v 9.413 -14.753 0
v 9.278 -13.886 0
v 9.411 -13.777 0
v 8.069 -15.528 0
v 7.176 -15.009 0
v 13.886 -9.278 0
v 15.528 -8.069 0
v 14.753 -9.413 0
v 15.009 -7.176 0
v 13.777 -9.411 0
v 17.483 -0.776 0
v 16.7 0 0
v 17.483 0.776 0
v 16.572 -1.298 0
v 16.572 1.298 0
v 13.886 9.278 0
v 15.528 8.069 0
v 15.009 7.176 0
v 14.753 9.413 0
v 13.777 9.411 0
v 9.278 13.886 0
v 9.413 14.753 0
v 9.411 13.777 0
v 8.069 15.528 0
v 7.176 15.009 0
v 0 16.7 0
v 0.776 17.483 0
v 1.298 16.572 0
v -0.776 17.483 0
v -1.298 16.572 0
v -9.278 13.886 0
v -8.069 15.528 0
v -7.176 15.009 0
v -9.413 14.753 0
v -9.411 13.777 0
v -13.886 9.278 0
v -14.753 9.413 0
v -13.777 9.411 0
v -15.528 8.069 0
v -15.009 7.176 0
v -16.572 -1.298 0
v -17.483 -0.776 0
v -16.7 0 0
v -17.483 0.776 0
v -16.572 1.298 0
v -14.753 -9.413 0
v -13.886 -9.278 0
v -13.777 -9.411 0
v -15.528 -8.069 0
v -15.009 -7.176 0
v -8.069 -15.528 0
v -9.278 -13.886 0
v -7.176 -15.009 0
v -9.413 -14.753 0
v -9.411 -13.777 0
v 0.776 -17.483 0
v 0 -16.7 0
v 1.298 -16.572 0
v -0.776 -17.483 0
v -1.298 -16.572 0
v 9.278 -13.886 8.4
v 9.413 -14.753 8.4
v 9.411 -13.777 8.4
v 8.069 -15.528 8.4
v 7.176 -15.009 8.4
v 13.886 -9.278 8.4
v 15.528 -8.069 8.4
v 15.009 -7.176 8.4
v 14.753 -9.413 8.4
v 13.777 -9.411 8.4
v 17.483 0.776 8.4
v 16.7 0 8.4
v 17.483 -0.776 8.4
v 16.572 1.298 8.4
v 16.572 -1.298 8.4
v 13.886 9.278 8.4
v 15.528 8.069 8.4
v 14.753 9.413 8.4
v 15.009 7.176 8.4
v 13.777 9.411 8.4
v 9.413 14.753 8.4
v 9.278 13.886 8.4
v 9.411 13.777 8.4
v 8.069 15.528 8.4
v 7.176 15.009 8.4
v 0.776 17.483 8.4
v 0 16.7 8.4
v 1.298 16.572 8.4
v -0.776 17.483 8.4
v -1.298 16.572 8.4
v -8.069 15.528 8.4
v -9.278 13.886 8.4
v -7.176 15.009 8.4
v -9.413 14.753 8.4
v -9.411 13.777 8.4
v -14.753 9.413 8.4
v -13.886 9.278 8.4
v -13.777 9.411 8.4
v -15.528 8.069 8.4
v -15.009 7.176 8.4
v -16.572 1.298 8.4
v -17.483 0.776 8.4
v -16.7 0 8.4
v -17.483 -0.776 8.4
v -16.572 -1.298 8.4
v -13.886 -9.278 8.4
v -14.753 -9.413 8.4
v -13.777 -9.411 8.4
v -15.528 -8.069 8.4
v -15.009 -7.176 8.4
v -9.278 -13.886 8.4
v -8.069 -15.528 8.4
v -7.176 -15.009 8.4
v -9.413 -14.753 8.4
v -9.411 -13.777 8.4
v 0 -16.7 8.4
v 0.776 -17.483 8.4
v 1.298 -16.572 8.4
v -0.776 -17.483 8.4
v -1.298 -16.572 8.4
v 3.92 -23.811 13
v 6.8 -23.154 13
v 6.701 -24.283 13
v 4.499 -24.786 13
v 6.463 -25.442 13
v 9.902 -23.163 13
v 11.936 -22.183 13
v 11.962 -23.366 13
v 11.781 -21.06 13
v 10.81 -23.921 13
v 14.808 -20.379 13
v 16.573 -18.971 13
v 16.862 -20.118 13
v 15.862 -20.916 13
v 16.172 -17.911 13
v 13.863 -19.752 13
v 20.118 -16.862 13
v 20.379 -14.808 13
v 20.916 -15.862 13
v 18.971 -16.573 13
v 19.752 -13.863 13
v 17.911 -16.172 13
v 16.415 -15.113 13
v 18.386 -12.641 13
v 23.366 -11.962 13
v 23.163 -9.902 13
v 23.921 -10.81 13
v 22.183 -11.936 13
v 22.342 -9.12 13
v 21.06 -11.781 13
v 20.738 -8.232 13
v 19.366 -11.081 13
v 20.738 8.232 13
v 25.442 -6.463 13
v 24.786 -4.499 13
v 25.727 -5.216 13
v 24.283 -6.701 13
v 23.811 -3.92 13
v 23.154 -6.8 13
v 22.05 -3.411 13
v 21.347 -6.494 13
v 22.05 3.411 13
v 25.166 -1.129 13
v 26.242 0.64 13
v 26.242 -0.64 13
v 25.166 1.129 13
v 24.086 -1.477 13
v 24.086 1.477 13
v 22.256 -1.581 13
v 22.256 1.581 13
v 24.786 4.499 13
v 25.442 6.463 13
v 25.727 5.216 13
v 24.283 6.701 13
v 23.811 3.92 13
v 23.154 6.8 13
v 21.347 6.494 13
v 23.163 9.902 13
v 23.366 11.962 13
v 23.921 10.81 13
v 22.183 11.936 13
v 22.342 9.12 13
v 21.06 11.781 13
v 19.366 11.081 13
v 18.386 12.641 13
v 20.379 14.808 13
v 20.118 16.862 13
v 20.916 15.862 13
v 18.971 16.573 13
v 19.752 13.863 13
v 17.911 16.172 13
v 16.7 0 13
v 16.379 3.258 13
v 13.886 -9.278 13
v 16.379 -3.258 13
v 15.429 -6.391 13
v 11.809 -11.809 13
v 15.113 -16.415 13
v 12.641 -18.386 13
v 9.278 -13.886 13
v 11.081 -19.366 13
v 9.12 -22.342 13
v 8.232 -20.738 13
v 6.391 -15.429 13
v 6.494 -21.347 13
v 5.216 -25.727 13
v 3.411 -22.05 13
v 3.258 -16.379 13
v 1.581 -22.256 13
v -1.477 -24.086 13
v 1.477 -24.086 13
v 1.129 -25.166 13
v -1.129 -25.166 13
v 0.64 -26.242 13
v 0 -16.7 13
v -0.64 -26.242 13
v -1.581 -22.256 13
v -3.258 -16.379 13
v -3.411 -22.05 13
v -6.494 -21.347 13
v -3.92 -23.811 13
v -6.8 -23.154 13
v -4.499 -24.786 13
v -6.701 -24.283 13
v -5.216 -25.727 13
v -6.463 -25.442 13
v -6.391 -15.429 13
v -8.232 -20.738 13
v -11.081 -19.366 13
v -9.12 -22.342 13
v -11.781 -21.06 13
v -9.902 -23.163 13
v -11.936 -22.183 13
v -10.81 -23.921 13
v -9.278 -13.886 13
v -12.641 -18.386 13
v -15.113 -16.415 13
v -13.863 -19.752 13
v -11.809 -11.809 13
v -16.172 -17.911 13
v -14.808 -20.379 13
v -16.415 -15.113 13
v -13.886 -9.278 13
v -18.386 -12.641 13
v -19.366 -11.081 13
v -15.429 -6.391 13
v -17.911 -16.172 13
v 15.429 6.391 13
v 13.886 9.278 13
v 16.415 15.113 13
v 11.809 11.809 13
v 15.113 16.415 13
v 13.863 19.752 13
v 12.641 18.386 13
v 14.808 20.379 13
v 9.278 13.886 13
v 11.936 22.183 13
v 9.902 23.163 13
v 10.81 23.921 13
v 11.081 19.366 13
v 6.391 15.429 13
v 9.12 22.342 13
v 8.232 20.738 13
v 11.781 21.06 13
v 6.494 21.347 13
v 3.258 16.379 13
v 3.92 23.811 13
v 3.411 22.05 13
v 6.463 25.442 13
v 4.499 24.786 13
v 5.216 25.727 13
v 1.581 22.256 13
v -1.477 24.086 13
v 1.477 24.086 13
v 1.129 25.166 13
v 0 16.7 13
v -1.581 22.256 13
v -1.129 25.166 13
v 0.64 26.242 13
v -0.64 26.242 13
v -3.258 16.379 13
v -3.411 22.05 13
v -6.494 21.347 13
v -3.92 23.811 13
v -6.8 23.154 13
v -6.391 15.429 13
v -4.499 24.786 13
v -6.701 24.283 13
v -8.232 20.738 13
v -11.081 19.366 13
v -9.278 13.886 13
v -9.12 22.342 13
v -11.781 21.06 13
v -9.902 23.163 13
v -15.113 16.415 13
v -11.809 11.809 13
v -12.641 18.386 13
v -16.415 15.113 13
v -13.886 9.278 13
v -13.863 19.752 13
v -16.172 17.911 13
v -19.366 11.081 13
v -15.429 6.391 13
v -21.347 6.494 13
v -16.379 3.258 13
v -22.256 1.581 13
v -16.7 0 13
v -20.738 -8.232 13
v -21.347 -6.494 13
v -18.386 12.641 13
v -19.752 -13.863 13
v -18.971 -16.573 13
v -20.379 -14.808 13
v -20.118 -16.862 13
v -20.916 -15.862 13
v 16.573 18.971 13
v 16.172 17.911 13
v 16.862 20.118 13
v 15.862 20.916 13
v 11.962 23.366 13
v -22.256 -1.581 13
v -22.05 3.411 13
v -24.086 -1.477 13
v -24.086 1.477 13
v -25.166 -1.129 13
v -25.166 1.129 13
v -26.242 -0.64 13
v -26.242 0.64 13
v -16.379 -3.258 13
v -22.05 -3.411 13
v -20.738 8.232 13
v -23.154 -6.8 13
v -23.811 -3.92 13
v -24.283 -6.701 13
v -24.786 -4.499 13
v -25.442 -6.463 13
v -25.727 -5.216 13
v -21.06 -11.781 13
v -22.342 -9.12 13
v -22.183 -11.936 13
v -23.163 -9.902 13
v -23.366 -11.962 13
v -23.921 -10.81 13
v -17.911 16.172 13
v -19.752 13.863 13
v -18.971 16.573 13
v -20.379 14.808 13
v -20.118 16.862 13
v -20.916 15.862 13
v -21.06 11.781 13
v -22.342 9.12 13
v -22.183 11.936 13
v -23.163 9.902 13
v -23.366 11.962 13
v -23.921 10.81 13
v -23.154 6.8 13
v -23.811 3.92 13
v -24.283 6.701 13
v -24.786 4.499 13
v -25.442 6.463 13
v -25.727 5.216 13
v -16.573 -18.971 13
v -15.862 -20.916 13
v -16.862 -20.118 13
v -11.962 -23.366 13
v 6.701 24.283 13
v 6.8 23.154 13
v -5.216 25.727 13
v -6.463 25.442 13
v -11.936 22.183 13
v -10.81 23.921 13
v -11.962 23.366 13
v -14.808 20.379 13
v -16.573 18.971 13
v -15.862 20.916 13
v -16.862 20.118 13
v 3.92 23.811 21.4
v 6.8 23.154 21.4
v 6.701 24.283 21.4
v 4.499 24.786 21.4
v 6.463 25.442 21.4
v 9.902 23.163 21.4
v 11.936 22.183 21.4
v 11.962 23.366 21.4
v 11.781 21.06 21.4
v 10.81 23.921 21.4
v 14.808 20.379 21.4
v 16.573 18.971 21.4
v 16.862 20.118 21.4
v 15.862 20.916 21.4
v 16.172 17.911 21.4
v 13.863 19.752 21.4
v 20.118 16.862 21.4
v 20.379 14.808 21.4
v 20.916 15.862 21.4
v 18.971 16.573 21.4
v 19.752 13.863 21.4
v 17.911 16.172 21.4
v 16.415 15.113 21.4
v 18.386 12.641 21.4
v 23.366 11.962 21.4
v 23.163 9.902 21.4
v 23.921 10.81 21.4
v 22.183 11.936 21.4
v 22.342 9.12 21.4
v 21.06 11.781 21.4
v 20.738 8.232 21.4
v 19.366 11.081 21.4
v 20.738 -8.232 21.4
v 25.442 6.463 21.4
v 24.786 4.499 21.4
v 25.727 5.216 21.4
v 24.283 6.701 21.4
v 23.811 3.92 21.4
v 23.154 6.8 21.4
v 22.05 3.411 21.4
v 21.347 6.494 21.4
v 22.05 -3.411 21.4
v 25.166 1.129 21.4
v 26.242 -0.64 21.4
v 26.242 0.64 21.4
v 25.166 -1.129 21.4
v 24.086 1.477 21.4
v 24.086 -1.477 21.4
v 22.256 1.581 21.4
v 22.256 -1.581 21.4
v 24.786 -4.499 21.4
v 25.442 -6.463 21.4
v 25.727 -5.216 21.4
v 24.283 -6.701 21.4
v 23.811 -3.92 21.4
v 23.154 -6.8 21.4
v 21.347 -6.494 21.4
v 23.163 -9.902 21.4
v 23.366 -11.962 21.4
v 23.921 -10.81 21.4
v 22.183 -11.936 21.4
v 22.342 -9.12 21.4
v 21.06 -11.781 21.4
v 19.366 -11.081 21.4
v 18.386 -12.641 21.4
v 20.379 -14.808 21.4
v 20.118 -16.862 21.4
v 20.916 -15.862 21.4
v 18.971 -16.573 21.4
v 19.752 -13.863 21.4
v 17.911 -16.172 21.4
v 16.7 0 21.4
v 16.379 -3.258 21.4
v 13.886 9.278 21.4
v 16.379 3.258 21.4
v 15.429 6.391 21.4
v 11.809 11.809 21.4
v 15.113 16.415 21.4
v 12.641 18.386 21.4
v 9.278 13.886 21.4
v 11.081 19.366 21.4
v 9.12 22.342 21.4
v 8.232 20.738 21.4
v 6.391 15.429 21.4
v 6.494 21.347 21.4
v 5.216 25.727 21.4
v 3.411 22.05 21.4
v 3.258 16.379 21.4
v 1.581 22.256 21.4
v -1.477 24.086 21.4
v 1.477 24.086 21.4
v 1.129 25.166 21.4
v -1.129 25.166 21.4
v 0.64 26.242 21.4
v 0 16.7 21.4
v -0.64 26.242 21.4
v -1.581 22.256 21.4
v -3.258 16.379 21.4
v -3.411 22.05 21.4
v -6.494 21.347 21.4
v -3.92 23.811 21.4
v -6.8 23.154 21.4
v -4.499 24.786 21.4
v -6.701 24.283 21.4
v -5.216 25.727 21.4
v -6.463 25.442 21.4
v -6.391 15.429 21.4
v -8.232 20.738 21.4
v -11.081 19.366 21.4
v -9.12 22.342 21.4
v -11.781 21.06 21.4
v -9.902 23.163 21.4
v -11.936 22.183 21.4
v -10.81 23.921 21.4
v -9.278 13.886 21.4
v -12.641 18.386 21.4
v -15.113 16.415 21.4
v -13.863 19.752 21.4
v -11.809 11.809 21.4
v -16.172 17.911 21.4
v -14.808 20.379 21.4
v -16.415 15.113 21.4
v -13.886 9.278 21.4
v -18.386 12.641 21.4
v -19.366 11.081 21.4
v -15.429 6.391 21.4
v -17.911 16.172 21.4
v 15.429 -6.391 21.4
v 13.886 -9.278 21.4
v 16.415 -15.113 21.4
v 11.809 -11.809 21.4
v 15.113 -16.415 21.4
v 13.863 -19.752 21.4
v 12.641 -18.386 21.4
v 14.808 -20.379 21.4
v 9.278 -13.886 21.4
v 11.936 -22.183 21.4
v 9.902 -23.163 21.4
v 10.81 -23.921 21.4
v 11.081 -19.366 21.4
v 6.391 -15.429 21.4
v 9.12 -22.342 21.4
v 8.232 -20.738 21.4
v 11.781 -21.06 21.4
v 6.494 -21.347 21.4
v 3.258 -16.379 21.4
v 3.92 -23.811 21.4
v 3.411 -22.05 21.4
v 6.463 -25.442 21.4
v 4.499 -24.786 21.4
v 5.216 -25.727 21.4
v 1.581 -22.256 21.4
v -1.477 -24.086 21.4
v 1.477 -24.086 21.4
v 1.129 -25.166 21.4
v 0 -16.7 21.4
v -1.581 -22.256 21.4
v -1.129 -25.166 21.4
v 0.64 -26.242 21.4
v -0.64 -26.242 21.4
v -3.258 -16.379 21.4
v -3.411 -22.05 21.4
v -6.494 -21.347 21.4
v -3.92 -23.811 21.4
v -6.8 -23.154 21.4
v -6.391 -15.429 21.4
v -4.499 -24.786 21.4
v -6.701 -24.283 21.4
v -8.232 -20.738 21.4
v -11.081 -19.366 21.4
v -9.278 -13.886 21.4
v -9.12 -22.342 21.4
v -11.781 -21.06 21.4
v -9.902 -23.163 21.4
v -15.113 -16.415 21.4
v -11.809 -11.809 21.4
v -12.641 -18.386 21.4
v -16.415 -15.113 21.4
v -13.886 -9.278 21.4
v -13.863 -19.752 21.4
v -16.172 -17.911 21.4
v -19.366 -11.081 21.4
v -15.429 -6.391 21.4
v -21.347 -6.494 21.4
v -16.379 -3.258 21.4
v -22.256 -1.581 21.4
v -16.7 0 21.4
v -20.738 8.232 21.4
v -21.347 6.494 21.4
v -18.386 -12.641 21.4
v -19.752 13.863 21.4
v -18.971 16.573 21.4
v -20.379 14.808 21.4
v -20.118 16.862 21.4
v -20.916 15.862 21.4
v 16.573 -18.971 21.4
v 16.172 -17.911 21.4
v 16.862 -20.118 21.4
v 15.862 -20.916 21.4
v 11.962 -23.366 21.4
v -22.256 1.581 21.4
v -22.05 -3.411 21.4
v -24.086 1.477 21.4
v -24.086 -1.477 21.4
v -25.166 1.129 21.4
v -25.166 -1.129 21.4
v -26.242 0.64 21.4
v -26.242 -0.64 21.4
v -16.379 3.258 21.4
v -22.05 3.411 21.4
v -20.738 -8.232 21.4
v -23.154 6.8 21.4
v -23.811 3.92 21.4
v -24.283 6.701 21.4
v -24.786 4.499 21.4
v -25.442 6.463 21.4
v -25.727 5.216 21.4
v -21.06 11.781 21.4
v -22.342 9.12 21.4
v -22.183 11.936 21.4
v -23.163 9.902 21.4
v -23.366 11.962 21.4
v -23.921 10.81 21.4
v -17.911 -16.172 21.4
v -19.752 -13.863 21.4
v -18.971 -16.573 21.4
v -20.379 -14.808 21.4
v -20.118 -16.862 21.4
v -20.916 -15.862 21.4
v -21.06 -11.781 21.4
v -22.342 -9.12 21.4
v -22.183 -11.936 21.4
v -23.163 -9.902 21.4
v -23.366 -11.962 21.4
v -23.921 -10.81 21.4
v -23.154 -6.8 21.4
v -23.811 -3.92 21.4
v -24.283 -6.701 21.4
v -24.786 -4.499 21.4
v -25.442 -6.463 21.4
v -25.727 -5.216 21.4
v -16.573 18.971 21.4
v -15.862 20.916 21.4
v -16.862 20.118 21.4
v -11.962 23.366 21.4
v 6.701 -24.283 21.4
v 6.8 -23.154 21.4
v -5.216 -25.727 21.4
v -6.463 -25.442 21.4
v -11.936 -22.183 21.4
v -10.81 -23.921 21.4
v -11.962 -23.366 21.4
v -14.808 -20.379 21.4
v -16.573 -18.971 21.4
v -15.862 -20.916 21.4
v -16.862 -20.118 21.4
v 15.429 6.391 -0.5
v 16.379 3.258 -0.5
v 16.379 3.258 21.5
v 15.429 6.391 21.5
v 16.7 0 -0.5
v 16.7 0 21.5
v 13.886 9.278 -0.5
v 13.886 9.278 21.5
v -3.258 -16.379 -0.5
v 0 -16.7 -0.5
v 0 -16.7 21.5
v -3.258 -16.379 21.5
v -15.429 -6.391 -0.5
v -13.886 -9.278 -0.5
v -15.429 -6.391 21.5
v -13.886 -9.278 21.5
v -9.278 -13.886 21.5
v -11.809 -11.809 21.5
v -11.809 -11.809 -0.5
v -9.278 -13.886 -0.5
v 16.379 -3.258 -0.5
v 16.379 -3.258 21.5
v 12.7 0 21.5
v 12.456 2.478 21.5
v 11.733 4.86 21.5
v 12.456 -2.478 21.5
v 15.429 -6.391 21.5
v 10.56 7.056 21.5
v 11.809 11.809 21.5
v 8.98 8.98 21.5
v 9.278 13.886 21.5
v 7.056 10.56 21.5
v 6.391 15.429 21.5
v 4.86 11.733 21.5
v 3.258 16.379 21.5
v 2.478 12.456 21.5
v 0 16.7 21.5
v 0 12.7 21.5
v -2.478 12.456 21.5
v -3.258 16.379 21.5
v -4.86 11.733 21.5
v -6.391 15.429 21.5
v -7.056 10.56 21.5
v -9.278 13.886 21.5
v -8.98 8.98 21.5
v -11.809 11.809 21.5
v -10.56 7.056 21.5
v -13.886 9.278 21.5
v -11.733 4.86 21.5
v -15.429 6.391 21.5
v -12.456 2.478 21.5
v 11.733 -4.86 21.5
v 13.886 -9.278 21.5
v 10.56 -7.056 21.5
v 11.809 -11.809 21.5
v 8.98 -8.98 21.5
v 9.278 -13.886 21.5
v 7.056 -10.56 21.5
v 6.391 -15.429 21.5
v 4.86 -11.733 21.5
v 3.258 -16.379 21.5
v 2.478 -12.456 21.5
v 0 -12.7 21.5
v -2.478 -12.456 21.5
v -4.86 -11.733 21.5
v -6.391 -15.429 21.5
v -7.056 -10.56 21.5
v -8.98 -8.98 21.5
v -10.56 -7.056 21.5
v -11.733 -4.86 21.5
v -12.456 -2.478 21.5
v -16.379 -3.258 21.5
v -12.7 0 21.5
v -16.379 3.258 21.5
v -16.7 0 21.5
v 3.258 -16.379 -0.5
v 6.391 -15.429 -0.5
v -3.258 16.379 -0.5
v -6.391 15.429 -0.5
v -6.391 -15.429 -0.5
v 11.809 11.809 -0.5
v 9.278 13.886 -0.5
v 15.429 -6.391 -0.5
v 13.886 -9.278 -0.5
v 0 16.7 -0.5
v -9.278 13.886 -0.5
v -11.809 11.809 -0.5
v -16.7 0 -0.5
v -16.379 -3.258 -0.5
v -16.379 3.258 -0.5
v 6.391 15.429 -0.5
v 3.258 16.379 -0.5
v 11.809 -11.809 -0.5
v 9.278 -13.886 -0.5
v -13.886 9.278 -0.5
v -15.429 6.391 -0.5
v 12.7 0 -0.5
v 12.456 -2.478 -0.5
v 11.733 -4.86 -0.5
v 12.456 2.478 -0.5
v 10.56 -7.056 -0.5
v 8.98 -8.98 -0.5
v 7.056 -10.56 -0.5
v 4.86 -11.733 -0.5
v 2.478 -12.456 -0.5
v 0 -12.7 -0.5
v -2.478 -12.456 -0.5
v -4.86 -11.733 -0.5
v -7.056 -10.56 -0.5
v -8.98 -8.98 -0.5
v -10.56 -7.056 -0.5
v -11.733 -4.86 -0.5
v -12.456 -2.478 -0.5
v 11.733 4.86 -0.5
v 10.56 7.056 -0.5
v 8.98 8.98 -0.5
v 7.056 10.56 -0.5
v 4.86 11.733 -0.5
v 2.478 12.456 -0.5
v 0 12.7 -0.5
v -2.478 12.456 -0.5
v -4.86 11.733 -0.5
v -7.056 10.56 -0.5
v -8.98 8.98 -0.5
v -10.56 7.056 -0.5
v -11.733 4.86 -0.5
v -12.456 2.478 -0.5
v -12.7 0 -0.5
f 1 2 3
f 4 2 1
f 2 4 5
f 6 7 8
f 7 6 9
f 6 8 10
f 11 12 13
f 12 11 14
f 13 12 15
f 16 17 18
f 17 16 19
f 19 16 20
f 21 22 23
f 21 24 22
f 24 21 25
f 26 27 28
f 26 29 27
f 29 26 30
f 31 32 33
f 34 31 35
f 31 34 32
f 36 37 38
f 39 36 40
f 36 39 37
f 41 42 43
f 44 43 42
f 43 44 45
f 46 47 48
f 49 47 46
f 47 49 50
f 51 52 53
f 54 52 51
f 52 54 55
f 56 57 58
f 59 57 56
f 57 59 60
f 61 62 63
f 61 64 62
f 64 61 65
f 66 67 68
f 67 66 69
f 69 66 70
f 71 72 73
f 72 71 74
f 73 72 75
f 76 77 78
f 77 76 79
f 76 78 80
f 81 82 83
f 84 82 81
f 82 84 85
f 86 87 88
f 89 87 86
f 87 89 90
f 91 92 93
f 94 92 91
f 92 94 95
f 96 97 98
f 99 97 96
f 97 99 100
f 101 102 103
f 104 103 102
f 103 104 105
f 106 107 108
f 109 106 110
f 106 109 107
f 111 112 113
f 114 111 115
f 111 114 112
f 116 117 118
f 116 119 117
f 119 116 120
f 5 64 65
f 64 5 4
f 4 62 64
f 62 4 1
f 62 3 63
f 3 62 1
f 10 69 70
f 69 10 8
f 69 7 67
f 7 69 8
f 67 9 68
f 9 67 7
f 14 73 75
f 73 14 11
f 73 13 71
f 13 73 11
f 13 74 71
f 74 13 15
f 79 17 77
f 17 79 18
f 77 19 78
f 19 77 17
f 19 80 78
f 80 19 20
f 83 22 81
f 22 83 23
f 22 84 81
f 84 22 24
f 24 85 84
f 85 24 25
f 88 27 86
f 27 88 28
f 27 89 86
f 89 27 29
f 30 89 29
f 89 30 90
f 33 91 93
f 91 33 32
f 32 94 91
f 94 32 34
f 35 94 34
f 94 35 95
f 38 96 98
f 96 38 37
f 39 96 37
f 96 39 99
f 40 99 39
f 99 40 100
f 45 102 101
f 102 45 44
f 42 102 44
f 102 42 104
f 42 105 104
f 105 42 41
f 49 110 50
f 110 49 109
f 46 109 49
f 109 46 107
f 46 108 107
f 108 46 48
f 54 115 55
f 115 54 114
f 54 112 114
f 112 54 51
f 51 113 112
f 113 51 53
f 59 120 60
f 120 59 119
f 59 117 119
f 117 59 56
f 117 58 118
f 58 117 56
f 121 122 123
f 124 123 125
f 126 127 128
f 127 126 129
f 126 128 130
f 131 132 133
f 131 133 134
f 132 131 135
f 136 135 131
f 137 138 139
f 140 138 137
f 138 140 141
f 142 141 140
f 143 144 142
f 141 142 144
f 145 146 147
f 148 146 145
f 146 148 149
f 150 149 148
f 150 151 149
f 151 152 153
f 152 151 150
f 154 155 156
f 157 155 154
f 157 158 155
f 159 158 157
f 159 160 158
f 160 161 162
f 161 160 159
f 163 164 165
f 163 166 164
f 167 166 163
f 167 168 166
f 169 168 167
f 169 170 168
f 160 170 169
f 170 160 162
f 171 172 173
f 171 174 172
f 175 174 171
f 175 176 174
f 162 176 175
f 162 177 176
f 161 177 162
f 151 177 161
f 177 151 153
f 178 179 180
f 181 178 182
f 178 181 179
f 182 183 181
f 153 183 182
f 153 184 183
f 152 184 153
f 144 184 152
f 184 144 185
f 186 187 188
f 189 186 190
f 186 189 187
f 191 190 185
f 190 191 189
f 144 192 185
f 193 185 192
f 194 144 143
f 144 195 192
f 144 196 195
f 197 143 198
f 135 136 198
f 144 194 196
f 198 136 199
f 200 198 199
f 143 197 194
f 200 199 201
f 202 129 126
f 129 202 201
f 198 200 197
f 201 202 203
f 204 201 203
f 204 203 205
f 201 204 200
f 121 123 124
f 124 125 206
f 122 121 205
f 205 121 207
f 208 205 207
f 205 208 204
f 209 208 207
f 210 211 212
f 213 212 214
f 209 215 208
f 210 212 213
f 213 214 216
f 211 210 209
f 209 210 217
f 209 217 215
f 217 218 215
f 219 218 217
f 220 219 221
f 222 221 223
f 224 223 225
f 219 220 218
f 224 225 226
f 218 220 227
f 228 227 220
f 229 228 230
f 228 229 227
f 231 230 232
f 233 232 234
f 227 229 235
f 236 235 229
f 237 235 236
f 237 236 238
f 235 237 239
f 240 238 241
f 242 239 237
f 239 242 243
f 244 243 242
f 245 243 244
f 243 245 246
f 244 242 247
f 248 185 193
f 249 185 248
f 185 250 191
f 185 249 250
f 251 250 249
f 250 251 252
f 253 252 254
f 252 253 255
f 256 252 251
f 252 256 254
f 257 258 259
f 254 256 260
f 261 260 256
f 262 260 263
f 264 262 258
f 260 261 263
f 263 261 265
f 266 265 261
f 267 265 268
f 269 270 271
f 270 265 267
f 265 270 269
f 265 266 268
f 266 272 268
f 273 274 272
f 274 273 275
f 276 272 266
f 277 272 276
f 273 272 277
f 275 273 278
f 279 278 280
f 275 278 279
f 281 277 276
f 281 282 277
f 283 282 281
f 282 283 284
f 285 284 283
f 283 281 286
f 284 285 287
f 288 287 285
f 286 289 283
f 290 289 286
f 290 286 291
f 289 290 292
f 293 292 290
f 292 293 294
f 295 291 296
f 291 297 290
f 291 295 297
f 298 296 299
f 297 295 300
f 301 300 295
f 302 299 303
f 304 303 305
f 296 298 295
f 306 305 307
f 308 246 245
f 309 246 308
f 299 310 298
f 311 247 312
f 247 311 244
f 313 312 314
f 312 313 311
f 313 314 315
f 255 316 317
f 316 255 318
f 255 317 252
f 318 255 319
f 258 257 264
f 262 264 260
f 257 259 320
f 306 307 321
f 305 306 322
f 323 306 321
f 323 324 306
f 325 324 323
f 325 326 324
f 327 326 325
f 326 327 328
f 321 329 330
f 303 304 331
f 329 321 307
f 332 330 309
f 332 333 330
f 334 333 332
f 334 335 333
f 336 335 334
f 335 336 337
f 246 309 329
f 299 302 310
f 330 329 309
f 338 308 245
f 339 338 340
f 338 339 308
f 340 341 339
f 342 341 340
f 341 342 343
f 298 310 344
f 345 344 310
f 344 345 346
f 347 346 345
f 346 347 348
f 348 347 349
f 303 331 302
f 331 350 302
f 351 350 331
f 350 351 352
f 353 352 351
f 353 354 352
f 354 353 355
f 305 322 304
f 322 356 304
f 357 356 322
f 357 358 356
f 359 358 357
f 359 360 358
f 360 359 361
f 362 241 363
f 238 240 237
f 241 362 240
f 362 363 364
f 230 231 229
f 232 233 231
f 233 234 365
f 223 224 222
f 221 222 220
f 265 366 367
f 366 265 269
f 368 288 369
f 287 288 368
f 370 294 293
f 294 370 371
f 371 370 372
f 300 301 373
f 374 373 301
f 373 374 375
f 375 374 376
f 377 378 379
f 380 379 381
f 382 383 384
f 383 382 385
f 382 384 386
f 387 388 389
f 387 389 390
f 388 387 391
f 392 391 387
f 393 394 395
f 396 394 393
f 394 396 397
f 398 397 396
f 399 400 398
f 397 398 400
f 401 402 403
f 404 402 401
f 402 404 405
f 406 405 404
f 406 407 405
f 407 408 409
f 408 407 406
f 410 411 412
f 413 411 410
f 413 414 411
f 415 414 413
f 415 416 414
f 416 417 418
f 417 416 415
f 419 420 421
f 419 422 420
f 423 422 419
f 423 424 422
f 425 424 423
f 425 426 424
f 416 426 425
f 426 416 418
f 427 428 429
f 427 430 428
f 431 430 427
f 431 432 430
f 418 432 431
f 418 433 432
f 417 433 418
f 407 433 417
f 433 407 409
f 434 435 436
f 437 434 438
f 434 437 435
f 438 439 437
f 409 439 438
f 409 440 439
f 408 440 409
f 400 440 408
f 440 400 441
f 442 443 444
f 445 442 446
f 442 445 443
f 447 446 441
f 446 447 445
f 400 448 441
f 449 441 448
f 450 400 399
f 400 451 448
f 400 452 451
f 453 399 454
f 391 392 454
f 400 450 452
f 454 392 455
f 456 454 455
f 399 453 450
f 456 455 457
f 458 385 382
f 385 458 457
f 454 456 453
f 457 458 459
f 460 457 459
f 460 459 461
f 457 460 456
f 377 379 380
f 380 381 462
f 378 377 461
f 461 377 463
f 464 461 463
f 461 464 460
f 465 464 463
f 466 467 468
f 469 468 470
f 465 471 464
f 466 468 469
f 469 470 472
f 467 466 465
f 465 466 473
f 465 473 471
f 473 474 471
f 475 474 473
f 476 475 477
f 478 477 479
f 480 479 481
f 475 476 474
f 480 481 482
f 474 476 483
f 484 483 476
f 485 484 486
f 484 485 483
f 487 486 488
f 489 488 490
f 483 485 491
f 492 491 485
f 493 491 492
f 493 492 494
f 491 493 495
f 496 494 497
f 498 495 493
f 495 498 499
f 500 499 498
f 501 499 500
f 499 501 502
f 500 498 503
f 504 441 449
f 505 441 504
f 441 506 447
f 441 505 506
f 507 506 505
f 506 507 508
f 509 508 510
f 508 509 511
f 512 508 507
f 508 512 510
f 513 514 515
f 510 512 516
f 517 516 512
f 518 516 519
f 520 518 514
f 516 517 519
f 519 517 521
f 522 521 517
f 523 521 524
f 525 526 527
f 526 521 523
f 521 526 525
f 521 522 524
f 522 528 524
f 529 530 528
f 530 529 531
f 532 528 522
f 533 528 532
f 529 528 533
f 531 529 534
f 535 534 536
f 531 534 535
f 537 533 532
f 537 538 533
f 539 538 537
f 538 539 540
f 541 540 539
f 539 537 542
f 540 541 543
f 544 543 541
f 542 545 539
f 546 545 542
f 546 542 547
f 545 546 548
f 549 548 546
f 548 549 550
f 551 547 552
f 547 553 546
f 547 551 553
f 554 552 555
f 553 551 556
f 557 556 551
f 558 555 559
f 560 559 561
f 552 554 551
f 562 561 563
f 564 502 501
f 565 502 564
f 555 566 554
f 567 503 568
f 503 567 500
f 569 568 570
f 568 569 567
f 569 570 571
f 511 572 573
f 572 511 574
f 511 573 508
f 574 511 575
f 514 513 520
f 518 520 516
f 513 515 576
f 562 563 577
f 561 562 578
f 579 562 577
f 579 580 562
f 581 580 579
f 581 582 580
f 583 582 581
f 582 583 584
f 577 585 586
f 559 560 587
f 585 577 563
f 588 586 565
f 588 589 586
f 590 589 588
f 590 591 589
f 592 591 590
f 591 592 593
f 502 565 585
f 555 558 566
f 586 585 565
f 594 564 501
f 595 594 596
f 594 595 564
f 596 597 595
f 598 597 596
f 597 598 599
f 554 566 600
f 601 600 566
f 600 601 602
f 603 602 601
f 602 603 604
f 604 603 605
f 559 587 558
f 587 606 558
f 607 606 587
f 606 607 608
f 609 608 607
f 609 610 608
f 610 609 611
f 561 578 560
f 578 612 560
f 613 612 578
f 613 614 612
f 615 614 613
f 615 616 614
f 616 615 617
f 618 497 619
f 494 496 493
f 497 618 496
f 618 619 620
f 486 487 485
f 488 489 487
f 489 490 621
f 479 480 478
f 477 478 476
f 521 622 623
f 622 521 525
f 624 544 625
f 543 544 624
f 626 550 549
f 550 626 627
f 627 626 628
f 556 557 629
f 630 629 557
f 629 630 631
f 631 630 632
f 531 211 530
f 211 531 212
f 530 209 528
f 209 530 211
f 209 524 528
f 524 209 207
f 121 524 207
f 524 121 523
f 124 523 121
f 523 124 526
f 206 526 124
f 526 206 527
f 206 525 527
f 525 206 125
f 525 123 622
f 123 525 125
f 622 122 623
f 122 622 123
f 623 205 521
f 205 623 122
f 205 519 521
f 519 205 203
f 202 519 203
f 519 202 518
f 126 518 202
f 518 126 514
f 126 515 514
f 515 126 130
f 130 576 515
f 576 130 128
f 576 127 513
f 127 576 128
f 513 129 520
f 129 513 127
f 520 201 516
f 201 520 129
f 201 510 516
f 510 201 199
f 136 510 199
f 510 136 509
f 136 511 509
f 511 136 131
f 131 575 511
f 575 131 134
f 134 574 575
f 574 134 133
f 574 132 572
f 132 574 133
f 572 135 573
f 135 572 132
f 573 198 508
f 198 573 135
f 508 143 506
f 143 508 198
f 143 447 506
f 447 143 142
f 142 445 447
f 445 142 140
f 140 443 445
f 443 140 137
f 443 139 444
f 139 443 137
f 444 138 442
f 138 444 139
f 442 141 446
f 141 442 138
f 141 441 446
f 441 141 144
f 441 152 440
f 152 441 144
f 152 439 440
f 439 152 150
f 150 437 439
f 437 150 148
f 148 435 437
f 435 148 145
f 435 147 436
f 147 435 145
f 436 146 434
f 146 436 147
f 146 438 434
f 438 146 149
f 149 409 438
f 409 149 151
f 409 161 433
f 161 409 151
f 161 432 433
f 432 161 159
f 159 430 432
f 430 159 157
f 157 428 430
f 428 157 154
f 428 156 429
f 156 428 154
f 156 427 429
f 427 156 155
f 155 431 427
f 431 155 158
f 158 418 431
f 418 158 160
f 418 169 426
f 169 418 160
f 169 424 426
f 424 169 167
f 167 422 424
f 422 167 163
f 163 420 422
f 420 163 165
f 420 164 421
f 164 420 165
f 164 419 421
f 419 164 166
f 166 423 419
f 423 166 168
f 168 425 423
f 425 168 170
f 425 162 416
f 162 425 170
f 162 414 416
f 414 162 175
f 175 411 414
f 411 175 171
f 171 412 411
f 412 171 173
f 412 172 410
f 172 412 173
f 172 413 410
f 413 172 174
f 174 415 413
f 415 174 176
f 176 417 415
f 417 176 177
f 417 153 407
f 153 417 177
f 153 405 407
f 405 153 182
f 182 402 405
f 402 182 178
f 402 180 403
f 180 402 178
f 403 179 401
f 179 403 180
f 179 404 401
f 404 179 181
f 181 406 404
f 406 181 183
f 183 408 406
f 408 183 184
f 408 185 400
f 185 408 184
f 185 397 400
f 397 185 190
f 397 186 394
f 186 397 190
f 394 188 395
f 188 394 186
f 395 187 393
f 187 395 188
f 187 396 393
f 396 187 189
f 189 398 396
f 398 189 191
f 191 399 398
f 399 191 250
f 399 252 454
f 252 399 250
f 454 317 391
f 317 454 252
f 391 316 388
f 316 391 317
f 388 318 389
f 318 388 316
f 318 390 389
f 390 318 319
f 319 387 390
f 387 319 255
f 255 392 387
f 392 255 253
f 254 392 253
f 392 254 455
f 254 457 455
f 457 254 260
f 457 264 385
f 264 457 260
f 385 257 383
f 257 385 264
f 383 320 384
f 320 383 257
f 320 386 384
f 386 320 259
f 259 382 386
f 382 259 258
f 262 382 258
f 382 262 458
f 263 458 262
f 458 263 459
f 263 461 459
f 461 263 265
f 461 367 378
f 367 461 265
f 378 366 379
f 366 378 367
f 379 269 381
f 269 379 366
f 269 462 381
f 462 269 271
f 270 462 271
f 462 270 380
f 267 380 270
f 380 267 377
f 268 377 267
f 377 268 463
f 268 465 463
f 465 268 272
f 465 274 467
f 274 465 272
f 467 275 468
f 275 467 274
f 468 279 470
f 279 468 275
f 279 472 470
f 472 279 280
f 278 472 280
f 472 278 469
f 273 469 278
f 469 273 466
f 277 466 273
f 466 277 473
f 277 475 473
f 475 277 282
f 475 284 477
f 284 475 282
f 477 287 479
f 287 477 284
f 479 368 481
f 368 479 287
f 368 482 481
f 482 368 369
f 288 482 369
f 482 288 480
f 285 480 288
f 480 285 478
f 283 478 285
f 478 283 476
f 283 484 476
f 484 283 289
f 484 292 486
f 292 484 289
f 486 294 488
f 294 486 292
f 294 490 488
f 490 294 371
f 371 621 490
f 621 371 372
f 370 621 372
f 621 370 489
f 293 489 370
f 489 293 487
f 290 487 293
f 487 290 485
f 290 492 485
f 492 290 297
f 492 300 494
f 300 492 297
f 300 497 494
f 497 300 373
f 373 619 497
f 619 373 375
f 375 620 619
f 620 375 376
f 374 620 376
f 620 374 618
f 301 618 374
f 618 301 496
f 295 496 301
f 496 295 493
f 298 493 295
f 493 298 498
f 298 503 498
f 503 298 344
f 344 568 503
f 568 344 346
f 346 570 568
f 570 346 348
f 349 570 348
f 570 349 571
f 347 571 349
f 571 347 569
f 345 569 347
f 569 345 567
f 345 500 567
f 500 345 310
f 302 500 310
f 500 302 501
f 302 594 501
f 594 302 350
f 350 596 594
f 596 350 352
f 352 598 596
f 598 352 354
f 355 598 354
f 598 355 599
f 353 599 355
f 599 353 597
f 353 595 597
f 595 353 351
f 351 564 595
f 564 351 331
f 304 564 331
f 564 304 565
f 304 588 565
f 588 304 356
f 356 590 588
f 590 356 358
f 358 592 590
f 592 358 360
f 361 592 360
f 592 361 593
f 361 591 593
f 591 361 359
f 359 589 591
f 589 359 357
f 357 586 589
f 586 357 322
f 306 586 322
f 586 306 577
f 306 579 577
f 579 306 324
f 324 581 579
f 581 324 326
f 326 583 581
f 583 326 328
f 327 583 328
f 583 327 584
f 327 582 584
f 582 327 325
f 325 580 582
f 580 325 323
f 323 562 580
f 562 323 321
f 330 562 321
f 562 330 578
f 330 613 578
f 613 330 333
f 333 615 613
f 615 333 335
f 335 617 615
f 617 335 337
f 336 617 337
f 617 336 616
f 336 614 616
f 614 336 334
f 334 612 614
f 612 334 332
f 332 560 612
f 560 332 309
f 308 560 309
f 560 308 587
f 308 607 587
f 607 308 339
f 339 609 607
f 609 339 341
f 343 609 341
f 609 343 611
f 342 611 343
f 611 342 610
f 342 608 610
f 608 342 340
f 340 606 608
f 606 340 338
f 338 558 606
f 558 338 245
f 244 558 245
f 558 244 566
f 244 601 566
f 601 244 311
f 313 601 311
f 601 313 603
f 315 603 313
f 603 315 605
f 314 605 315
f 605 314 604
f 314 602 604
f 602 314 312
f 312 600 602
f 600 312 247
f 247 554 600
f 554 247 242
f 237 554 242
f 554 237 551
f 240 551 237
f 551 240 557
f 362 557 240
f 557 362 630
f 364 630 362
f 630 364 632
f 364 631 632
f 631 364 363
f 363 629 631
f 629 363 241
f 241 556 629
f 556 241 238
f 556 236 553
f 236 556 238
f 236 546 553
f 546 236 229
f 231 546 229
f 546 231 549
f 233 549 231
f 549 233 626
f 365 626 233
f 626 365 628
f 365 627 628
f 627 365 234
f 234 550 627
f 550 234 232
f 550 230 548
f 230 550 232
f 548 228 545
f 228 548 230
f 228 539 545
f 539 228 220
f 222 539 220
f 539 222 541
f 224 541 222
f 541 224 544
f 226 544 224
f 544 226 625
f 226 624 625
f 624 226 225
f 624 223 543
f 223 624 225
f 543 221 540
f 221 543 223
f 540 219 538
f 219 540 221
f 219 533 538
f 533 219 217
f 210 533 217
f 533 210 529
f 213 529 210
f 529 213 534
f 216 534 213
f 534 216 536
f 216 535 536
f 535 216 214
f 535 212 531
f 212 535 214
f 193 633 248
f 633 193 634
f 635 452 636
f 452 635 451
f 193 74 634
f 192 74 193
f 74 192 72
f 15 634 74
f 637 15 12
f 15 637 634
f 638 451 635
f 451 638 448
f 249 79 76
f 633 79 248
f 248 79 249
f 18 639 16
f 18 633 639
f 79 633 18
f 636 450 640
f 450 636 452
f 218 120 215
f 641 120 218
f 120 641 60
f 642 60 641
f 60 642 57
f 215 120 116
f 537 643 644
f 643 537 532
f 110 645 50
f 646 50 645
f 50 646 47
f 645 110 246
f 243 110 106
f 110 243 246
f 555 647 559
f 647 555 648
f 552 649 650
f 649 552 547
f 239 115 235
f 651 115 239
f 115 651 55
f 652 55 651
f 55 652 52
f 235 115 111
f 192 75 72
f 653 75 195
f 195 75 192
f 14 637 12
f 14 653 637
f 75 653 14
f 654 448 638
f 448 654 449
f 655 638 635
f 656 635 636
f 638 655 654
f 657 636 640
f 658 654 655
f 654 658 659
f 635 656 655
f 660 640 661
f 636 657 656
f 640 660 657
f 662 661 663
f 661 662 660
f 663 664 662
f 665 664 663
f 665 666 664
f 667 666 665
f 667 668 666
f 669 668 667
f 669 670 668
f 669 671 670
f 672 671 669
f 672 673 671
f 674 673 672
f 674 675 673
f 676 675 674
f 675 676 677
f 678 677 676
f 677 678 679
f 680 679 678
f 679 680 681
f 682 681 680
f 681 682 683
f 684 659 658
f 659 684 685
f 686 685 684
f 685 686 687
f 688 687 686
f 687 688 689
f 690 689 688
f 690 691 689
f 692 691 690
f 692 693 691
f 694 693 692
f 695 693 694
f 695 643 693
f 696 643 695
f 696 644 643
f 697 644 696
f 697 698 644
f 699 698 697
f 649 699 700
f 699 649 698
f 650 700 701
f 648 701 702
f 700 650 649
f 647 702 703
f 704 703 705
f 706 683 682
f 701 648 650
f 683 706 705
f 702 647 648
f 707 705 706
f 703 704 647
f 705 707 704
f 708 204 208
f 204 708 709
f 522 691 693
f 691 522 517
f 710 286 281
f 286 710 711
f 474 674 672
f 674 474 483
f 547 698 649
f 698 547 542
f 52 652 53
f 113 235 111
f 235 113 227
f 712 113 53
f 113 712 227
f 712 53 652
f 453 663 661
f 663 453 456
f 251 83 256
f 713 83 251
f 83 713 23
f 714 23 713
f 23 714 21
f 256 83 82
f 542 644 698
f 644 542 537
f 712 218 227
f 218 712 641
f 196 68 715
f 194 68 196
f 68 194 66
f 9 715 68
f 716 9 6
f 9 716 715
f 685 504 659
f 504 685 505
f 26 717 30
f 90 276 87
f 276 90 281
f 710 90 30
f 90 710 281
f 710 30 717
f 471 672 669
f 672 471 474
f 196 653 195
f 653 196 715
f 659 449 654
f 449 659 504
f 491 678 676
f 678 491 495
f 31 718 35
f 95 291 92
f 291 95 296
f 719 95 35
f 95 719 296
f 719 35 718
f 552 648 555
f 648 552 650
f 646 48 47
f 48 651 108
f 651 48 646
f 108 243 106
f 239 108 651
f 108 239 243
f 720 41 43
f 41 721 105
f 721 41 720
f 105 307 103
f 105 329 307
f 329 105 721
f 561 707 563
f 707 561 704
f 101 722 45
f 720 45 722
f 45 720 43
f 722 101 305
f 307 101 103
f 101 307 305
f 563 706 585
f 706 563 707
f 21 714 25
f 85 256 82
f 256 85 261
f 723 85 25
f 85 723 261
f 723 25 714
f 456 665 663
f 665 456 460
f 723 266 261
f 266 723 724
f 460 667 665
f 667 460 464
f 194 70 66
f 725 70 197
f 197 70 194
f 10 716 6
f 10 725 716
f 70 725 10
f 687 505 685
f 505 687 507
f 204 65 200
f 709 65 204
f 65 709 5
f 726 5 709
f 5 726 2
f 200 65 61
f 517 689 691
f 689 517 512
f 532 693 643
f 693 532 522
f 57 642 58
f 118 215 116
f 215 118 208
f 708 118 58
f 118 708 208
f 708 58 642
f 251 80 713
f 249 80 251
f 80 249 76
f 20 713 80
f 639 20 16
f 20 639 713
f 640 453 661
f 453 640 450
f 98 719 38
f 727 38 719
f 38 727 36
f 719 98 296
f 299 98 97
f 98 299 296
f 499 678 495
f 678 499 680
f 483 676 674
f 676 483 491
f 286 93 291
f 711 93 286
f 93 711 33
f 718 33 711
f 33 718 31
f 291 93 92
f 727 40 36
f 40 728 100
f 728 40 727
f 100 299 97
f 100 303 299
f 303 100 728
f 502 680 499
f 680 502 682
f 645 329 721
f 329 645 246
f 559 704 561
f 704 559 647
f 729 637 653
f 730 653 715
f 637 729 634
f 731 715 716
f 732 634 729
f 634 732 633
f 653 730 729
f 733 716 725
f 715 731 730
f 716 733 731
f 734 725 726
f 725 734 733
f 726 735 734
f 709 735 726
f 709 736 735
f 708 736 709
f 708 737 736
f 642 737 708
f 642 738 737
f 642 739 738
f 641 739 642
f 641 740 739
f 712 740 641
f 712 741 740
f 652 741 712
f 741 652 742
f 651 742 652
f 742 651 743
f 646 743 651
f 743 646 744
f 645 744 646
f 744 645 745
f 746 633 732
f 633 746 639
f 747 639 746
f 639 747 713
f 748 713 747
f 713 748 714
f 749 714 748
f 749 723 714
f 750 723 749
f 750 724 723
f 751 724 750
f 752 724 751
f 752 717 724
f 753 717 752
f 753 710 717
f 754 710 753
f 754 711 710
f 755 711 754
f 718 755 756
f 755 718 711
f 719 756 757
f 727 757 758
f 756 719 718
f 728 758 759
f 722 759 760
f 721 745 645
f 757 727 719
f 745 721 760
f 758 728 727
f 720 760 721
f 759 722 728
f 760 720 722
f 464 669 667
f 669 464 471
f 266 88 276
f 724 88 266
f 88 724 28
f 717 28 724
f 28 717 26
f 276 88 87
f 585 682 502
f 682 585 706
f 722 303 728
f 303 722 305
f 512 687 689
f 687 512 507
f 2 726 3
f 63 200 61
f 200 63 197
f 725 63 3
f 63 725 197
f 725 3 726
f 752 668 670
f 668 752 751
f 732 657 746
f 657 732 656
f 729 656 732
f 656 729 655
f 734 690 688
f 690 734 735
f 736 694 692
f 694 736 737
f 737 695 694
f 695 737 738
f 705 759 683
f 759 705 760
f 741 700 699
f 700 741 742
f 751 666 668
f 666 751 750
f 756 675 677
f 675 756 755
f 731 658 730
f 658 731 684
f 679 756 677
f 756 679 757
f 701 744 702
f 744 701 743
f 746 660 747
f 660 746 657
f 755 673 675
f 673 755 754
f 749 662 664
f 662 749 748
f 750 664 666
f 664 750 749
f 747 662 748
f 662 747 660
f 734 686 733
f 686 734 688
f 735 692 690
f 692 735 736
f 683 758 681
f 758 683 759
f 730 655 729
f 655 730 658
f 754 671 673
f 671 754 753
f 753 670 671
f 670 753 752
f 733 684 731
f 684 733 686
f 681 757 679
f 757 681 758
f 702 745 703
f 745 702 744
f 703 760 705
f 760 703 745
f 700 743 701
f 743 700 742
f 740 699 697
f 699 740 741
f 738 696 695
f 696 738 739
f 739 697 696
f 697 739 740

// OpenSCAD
$fn = 32;

// ----------------------------------------------------------------------
// Two-module gear rim: z12 m2.5 and z28 m1.75, 21 mm wide
// ----------------------------------------------------------------------

// --- parameters (mm) ---
module_a = 2.5;           // first tooth module
teeth_a = 12;             // first band tooth count
module_b = 1.75;          // second tooth module
teeth_b = 28;             // second band tooth count
band_h = 8;               // height of one tooth band
web_t = 5;                // web thickness between the bands
total = 21;               // overall width over both bands
root_r = 11.88;           // root radius of the coarse band
hub_r = 16.7;             // hub radius
bore_d = 25.4;            // hub bore
hole_count = 5;           // lightening holes
hole_r = 9.69;            // lightening hole circle radius
hole_d = 4;               // lightening hole diameter

band_a = [[11.749, -1.723], [15.146, -1.889], [16.318, -1.444], [17.483, -0.776], [17.483, 0.776], [16.318, 1.444], [15.146, 1.889], [11.749, 1.723], [11.037, 4.383], [14.062, 5.937], [14.854, 6.908], [15.528, 8.069], [14.753, 9.413], [13.41, 9.41], [12.172, 9.209], [9.314, 7.367], [7.367, 9.314], [9.209, 12.172], [9.41, 13.41], [9.413, 14.753], [8.069, 15.528], [6.908, 14.854], [5.937, 14.062], [4.383, 11.037], [1.723, 11.749], [1.889, 15.146], [1.444, 16.318], [0.776, 17.483], [-0.776, 17.483], [-1.444, 16.318], [-1.889, 15.146], [-1.723, 11.749], [-4.383, 11.037], [-5.937, 14.062], [-6.908, 14.854], [-8.069, 15.528], [-9.413, 14.753], [-9.41, 13.41], [-9.209, 12.172], [-7.367, 9.314], [-9.314, 7.367], [-12.172, 9.209], [-13.41, 9.41], [-14.753, 9.413], [-15.528, 8.069], [-14.854, 6.908], [-14.062, 5.937], [-11.037, 4.383], [-11.749, 1.723], [-15.146, 1.889], [-16.318, 1.444], [-17.483, 0.776], [-17.483, -0.776], [-16.318, -1.444], [-15.146, -1.889], [-11.749, -1.723], [-11.037, -4.383], [-14.062, -5.937], [-14.854, -6.908], [-15.528, -8.069], [-14.753, -9.413], [-13.41, -9.41], [-12.172, -9.209], [-9.314, -7.367], [-7.367, -9.314], [-9.209, -12.172], [-9.41, -13.41], [-9.413, -14.753], [-8.069, -15.528], [-6.908, -14.854], [-5.937, -14.062], [-4.383, -11.037], [-1.723, -11.749], [-1.889, -15.146], [-1.444, -16.318], [-0.776, -17.483], [0.776, -17.483], [1.444, -16.318], [1.889, -15.146], [1.723, -11.749], [4.383, -11.037], [5.937, -14.062], [6.908, -14.854], [8.069, -15.528], [9.413, -14.753], [9.41, -13.41], [9.209, -12.172], [7.367, -9.314], [9.314, -7.367], [12.172, -9.209], [13.41, -9.41], [14.753, -9.413], [15.528, -8.069], [14.854, -6.908], [14.062, -5.937], [11.037, -4.383]];
band_b = [[22.256, -1.581], [24.086, -1.477], [25.166, -1.129], [26.242, -0.64], [26.242, 0.64], [25.166, 1.129], [24.086, 1.477], [22.256, 1.581], [22.05, 3.411], [23.811, 3.92], [24.786, 4.499], [25.727, 5.216], [25.442, 6.463], [24.283, 6.701], [23.154, 6.8], [21.347, 6.494], [20.738, 8.232], [22.342, 9.12], [23.163, 9.902], [23.921, 10.81], [23.366, 11.962], [22.183, 11.936], [21.06, 11.781], [19.366, 11.081], [18.386, 12.641], [19.752, 13.863], [20.379, 14.808], [20.916, 15.862], [20.118, 16.862], [18.971, 16.573], [17.911, 16.172], [16.415, 15.113], [15.113, 16.415], [16.172, 17.911], [16.573, 18.971], [16.862, 20.118], [15.862, 20.916], [14.808, 20.379], [13.863, 19.752], [12.641, 18.386], [11.081, 19.366], [11.781, 21.06], [11.936, 22.183], [11.962, 23.366], [10.81, 23.921], [9.902, 23.163], [9.12, 22.342], [8.232, 20.738], [6.494, 21.347], [6.8, 23.154], [6.701, 24.283], [6.463, 25.442], [5.216, 25.727], [4.499, 24.786], [3.92, 23.811], [3.411, 22.05], [1.581, 22.256], [1.477, 24.086], [1.129, 25.166], [0.64, 26.242], [-0.64, 26.242], [-1.129, 25.166], [-1.477, 24.086], [-1.581, 22.256], [-3.411, 22.05], [-3.92, 23.811], [-4.499, 24.786], [-5.216, 25.727], [-6.463, 25.442], [-6.701, 24.283], [-6.8, 23.154], [-6.494, 21.347], [-8.232, 20.738], [-9.12, 22.342], [-9.902, 23.163], [-10.81, 23.921], [-11.962, 23.366], [-11.936, 22.183], [-11.781, 21.06], [-11.081, 19.366], [-12.641, 18.386], [-13.863, 19.752], [-14.808, 20.379], [-15.862, 20.916], [-16.862, 20.118], [-16.573, 18.971], [-16.172, 17.911], [-15.113, 16.415], [-16.415, 15.113], [-17.911, 16.172], [-18.971, 16.573], [-20.118, 16.862], [-20.916, 15.862], [-20.379, 14.808], [-19.752, 13.863], [-18.386, 12.641], [-19.366, 11.081], [-21.06, 11.781], [-22.183, 11.936], [-23.366, 11.962], [-23.921, 10.81], [-23.163, 9.902], [-22.342, 9.12], [-20.738, 8.232], [-21.347, 6.494], [-23.154, 6.8], [-24.283, 6.701], [-25.442, 6.463], [-25.727, 5.216], [-24.786, 4.499], [-23.811, 3.92], [-22.05, 3.411], [-22.256, 1.581], [-24.086, 1.477], [-25.166, 1.129], [-26.242, 0.64], [-26.242, -0.64], [-25.166, -1.129], [-24.086, -1.477], [-22.256, -1.581], [-22.05, -3.411], [-23.811, -3.92], [-24.786, -4.499], [-25.727, -5.216], [-25.442, -6.463], [-24.283, -6.701], [-23.154, -6.8], [-21.347, -6.494], [-20.738, -8.232], [-22.342, -9.12], [-23.163, -9.902], [-23.921, -10.81], [-23.366, -11.962], [-22.183, -11.936], [-21.06, -11.781], [-19.366, -11.081], [-18.386, -12.641], [-19.752, -13.863], [-20.379, -14.808], [-20.916, -15.862], [-20.118, -16.862], [-18.971, -16.573], [-17.911, -16.172], [-16.415, -15.113], [-15.113, -16.415], [-16.172, -17.911], [-16.573, -18.971], [-16.862, -20.118], [-15.862, -20.916], [-14.808, -20.379], [-13.863, -19.752], [-12.641, -18.386], [-11.081, -19.366], [-11.781, -21.06], [-11.936, -22.183], [-11.962, -23.366], [-10.81, -23.921], [-9.902, -23.163], [-9.12, -22.342], [-8.232, -20.738], [-6.494, -21.347], [-6.8, -23.154], [-6.701, -24.283], [-6.463, -25.442], [-5.216, -25.727], [-4.499, -24.786], [-3.92, -23.811], [-3.411, -22.05], [-1.581, -22.256], [-1.477, -24.086], [-1.129, -25.166], [-0.64, -26.242], [0.64, -26.242], [1.129, -25.166], [1.477, -24.086], [1.581, -22.256], [3.411, -22.05], [3.92, -23.811], [4.499, -24.786], [5.216, -25.727], [6.463, -25.442], [6.701, -24.283], [6.8, -23.154], [6.494, -21.347], [8.232, -20.738], [9.12, -22.342], [9.902, -23.163], [10.81, -23.921], [11.962, -23.366], [11.936, -22.183], [11.781, -21.06], [11.081, -19.366], [12.641, -18.386], [13.863, -19.752], [14.808, -20.379], [15.862, -20.916], [16.862, -20.118], [16.573, -18.971], [16.172, -17.911], [15.113, -16.415], [16.415, -15.113], [17.911, -16.172], [18.971, -16.573], [20.118, -16.862], [20.916, -15.862], [20.379, -14.808], [19.752, -13.863], [18.386, -12.641], [19.366, -11.081], [21.06, -11.781], [22.183, -11.936], [23.366, -11.962], [23.921, -10.81], [23.163, -9.902], [22.342, -9.12], [20.738, -8.232], [21.347, -6.494], [23.154, -6.8], [24.283, -6.701], [25.442, -6.463], [25.727, -5.216], [24.786, -4.499], [23.811, -3.92], [22.05, -3.411]];

difference() {
  union() {
    /* tooth band A, overlapping the web by 0.4 mm */
    linear_extrude(height = band_h + 0.4) polygon(band_a);
    /* web */
    translate([0, 0, band_h - 0.4]) cylinder(h = web_t + 0.8, d = 2 * root_r);
    /* tooth band B */
    translate([0, 0, band_h + web_t]) linear_extrude(height = band_h + 0.4) polygon(band_b);
    /* hub */
    translate([0, 0, -0.5]) cylinder(h = total + 1.0, d = 2 * hub_r);
  }
  /* bore */
  translate([0, 0, -2.5]) cylinder(h = total + 5, d = bore_d);
  /* lightening holes through the web */
  for (i = [0 : hole_count - 1]) {
    a = i * 360 / hole_count;
    translate([hole_r * cos(a), hole_r * sin(a), -2.5]) cylinder(h = total + 5, d = hole_d);
  }
}
